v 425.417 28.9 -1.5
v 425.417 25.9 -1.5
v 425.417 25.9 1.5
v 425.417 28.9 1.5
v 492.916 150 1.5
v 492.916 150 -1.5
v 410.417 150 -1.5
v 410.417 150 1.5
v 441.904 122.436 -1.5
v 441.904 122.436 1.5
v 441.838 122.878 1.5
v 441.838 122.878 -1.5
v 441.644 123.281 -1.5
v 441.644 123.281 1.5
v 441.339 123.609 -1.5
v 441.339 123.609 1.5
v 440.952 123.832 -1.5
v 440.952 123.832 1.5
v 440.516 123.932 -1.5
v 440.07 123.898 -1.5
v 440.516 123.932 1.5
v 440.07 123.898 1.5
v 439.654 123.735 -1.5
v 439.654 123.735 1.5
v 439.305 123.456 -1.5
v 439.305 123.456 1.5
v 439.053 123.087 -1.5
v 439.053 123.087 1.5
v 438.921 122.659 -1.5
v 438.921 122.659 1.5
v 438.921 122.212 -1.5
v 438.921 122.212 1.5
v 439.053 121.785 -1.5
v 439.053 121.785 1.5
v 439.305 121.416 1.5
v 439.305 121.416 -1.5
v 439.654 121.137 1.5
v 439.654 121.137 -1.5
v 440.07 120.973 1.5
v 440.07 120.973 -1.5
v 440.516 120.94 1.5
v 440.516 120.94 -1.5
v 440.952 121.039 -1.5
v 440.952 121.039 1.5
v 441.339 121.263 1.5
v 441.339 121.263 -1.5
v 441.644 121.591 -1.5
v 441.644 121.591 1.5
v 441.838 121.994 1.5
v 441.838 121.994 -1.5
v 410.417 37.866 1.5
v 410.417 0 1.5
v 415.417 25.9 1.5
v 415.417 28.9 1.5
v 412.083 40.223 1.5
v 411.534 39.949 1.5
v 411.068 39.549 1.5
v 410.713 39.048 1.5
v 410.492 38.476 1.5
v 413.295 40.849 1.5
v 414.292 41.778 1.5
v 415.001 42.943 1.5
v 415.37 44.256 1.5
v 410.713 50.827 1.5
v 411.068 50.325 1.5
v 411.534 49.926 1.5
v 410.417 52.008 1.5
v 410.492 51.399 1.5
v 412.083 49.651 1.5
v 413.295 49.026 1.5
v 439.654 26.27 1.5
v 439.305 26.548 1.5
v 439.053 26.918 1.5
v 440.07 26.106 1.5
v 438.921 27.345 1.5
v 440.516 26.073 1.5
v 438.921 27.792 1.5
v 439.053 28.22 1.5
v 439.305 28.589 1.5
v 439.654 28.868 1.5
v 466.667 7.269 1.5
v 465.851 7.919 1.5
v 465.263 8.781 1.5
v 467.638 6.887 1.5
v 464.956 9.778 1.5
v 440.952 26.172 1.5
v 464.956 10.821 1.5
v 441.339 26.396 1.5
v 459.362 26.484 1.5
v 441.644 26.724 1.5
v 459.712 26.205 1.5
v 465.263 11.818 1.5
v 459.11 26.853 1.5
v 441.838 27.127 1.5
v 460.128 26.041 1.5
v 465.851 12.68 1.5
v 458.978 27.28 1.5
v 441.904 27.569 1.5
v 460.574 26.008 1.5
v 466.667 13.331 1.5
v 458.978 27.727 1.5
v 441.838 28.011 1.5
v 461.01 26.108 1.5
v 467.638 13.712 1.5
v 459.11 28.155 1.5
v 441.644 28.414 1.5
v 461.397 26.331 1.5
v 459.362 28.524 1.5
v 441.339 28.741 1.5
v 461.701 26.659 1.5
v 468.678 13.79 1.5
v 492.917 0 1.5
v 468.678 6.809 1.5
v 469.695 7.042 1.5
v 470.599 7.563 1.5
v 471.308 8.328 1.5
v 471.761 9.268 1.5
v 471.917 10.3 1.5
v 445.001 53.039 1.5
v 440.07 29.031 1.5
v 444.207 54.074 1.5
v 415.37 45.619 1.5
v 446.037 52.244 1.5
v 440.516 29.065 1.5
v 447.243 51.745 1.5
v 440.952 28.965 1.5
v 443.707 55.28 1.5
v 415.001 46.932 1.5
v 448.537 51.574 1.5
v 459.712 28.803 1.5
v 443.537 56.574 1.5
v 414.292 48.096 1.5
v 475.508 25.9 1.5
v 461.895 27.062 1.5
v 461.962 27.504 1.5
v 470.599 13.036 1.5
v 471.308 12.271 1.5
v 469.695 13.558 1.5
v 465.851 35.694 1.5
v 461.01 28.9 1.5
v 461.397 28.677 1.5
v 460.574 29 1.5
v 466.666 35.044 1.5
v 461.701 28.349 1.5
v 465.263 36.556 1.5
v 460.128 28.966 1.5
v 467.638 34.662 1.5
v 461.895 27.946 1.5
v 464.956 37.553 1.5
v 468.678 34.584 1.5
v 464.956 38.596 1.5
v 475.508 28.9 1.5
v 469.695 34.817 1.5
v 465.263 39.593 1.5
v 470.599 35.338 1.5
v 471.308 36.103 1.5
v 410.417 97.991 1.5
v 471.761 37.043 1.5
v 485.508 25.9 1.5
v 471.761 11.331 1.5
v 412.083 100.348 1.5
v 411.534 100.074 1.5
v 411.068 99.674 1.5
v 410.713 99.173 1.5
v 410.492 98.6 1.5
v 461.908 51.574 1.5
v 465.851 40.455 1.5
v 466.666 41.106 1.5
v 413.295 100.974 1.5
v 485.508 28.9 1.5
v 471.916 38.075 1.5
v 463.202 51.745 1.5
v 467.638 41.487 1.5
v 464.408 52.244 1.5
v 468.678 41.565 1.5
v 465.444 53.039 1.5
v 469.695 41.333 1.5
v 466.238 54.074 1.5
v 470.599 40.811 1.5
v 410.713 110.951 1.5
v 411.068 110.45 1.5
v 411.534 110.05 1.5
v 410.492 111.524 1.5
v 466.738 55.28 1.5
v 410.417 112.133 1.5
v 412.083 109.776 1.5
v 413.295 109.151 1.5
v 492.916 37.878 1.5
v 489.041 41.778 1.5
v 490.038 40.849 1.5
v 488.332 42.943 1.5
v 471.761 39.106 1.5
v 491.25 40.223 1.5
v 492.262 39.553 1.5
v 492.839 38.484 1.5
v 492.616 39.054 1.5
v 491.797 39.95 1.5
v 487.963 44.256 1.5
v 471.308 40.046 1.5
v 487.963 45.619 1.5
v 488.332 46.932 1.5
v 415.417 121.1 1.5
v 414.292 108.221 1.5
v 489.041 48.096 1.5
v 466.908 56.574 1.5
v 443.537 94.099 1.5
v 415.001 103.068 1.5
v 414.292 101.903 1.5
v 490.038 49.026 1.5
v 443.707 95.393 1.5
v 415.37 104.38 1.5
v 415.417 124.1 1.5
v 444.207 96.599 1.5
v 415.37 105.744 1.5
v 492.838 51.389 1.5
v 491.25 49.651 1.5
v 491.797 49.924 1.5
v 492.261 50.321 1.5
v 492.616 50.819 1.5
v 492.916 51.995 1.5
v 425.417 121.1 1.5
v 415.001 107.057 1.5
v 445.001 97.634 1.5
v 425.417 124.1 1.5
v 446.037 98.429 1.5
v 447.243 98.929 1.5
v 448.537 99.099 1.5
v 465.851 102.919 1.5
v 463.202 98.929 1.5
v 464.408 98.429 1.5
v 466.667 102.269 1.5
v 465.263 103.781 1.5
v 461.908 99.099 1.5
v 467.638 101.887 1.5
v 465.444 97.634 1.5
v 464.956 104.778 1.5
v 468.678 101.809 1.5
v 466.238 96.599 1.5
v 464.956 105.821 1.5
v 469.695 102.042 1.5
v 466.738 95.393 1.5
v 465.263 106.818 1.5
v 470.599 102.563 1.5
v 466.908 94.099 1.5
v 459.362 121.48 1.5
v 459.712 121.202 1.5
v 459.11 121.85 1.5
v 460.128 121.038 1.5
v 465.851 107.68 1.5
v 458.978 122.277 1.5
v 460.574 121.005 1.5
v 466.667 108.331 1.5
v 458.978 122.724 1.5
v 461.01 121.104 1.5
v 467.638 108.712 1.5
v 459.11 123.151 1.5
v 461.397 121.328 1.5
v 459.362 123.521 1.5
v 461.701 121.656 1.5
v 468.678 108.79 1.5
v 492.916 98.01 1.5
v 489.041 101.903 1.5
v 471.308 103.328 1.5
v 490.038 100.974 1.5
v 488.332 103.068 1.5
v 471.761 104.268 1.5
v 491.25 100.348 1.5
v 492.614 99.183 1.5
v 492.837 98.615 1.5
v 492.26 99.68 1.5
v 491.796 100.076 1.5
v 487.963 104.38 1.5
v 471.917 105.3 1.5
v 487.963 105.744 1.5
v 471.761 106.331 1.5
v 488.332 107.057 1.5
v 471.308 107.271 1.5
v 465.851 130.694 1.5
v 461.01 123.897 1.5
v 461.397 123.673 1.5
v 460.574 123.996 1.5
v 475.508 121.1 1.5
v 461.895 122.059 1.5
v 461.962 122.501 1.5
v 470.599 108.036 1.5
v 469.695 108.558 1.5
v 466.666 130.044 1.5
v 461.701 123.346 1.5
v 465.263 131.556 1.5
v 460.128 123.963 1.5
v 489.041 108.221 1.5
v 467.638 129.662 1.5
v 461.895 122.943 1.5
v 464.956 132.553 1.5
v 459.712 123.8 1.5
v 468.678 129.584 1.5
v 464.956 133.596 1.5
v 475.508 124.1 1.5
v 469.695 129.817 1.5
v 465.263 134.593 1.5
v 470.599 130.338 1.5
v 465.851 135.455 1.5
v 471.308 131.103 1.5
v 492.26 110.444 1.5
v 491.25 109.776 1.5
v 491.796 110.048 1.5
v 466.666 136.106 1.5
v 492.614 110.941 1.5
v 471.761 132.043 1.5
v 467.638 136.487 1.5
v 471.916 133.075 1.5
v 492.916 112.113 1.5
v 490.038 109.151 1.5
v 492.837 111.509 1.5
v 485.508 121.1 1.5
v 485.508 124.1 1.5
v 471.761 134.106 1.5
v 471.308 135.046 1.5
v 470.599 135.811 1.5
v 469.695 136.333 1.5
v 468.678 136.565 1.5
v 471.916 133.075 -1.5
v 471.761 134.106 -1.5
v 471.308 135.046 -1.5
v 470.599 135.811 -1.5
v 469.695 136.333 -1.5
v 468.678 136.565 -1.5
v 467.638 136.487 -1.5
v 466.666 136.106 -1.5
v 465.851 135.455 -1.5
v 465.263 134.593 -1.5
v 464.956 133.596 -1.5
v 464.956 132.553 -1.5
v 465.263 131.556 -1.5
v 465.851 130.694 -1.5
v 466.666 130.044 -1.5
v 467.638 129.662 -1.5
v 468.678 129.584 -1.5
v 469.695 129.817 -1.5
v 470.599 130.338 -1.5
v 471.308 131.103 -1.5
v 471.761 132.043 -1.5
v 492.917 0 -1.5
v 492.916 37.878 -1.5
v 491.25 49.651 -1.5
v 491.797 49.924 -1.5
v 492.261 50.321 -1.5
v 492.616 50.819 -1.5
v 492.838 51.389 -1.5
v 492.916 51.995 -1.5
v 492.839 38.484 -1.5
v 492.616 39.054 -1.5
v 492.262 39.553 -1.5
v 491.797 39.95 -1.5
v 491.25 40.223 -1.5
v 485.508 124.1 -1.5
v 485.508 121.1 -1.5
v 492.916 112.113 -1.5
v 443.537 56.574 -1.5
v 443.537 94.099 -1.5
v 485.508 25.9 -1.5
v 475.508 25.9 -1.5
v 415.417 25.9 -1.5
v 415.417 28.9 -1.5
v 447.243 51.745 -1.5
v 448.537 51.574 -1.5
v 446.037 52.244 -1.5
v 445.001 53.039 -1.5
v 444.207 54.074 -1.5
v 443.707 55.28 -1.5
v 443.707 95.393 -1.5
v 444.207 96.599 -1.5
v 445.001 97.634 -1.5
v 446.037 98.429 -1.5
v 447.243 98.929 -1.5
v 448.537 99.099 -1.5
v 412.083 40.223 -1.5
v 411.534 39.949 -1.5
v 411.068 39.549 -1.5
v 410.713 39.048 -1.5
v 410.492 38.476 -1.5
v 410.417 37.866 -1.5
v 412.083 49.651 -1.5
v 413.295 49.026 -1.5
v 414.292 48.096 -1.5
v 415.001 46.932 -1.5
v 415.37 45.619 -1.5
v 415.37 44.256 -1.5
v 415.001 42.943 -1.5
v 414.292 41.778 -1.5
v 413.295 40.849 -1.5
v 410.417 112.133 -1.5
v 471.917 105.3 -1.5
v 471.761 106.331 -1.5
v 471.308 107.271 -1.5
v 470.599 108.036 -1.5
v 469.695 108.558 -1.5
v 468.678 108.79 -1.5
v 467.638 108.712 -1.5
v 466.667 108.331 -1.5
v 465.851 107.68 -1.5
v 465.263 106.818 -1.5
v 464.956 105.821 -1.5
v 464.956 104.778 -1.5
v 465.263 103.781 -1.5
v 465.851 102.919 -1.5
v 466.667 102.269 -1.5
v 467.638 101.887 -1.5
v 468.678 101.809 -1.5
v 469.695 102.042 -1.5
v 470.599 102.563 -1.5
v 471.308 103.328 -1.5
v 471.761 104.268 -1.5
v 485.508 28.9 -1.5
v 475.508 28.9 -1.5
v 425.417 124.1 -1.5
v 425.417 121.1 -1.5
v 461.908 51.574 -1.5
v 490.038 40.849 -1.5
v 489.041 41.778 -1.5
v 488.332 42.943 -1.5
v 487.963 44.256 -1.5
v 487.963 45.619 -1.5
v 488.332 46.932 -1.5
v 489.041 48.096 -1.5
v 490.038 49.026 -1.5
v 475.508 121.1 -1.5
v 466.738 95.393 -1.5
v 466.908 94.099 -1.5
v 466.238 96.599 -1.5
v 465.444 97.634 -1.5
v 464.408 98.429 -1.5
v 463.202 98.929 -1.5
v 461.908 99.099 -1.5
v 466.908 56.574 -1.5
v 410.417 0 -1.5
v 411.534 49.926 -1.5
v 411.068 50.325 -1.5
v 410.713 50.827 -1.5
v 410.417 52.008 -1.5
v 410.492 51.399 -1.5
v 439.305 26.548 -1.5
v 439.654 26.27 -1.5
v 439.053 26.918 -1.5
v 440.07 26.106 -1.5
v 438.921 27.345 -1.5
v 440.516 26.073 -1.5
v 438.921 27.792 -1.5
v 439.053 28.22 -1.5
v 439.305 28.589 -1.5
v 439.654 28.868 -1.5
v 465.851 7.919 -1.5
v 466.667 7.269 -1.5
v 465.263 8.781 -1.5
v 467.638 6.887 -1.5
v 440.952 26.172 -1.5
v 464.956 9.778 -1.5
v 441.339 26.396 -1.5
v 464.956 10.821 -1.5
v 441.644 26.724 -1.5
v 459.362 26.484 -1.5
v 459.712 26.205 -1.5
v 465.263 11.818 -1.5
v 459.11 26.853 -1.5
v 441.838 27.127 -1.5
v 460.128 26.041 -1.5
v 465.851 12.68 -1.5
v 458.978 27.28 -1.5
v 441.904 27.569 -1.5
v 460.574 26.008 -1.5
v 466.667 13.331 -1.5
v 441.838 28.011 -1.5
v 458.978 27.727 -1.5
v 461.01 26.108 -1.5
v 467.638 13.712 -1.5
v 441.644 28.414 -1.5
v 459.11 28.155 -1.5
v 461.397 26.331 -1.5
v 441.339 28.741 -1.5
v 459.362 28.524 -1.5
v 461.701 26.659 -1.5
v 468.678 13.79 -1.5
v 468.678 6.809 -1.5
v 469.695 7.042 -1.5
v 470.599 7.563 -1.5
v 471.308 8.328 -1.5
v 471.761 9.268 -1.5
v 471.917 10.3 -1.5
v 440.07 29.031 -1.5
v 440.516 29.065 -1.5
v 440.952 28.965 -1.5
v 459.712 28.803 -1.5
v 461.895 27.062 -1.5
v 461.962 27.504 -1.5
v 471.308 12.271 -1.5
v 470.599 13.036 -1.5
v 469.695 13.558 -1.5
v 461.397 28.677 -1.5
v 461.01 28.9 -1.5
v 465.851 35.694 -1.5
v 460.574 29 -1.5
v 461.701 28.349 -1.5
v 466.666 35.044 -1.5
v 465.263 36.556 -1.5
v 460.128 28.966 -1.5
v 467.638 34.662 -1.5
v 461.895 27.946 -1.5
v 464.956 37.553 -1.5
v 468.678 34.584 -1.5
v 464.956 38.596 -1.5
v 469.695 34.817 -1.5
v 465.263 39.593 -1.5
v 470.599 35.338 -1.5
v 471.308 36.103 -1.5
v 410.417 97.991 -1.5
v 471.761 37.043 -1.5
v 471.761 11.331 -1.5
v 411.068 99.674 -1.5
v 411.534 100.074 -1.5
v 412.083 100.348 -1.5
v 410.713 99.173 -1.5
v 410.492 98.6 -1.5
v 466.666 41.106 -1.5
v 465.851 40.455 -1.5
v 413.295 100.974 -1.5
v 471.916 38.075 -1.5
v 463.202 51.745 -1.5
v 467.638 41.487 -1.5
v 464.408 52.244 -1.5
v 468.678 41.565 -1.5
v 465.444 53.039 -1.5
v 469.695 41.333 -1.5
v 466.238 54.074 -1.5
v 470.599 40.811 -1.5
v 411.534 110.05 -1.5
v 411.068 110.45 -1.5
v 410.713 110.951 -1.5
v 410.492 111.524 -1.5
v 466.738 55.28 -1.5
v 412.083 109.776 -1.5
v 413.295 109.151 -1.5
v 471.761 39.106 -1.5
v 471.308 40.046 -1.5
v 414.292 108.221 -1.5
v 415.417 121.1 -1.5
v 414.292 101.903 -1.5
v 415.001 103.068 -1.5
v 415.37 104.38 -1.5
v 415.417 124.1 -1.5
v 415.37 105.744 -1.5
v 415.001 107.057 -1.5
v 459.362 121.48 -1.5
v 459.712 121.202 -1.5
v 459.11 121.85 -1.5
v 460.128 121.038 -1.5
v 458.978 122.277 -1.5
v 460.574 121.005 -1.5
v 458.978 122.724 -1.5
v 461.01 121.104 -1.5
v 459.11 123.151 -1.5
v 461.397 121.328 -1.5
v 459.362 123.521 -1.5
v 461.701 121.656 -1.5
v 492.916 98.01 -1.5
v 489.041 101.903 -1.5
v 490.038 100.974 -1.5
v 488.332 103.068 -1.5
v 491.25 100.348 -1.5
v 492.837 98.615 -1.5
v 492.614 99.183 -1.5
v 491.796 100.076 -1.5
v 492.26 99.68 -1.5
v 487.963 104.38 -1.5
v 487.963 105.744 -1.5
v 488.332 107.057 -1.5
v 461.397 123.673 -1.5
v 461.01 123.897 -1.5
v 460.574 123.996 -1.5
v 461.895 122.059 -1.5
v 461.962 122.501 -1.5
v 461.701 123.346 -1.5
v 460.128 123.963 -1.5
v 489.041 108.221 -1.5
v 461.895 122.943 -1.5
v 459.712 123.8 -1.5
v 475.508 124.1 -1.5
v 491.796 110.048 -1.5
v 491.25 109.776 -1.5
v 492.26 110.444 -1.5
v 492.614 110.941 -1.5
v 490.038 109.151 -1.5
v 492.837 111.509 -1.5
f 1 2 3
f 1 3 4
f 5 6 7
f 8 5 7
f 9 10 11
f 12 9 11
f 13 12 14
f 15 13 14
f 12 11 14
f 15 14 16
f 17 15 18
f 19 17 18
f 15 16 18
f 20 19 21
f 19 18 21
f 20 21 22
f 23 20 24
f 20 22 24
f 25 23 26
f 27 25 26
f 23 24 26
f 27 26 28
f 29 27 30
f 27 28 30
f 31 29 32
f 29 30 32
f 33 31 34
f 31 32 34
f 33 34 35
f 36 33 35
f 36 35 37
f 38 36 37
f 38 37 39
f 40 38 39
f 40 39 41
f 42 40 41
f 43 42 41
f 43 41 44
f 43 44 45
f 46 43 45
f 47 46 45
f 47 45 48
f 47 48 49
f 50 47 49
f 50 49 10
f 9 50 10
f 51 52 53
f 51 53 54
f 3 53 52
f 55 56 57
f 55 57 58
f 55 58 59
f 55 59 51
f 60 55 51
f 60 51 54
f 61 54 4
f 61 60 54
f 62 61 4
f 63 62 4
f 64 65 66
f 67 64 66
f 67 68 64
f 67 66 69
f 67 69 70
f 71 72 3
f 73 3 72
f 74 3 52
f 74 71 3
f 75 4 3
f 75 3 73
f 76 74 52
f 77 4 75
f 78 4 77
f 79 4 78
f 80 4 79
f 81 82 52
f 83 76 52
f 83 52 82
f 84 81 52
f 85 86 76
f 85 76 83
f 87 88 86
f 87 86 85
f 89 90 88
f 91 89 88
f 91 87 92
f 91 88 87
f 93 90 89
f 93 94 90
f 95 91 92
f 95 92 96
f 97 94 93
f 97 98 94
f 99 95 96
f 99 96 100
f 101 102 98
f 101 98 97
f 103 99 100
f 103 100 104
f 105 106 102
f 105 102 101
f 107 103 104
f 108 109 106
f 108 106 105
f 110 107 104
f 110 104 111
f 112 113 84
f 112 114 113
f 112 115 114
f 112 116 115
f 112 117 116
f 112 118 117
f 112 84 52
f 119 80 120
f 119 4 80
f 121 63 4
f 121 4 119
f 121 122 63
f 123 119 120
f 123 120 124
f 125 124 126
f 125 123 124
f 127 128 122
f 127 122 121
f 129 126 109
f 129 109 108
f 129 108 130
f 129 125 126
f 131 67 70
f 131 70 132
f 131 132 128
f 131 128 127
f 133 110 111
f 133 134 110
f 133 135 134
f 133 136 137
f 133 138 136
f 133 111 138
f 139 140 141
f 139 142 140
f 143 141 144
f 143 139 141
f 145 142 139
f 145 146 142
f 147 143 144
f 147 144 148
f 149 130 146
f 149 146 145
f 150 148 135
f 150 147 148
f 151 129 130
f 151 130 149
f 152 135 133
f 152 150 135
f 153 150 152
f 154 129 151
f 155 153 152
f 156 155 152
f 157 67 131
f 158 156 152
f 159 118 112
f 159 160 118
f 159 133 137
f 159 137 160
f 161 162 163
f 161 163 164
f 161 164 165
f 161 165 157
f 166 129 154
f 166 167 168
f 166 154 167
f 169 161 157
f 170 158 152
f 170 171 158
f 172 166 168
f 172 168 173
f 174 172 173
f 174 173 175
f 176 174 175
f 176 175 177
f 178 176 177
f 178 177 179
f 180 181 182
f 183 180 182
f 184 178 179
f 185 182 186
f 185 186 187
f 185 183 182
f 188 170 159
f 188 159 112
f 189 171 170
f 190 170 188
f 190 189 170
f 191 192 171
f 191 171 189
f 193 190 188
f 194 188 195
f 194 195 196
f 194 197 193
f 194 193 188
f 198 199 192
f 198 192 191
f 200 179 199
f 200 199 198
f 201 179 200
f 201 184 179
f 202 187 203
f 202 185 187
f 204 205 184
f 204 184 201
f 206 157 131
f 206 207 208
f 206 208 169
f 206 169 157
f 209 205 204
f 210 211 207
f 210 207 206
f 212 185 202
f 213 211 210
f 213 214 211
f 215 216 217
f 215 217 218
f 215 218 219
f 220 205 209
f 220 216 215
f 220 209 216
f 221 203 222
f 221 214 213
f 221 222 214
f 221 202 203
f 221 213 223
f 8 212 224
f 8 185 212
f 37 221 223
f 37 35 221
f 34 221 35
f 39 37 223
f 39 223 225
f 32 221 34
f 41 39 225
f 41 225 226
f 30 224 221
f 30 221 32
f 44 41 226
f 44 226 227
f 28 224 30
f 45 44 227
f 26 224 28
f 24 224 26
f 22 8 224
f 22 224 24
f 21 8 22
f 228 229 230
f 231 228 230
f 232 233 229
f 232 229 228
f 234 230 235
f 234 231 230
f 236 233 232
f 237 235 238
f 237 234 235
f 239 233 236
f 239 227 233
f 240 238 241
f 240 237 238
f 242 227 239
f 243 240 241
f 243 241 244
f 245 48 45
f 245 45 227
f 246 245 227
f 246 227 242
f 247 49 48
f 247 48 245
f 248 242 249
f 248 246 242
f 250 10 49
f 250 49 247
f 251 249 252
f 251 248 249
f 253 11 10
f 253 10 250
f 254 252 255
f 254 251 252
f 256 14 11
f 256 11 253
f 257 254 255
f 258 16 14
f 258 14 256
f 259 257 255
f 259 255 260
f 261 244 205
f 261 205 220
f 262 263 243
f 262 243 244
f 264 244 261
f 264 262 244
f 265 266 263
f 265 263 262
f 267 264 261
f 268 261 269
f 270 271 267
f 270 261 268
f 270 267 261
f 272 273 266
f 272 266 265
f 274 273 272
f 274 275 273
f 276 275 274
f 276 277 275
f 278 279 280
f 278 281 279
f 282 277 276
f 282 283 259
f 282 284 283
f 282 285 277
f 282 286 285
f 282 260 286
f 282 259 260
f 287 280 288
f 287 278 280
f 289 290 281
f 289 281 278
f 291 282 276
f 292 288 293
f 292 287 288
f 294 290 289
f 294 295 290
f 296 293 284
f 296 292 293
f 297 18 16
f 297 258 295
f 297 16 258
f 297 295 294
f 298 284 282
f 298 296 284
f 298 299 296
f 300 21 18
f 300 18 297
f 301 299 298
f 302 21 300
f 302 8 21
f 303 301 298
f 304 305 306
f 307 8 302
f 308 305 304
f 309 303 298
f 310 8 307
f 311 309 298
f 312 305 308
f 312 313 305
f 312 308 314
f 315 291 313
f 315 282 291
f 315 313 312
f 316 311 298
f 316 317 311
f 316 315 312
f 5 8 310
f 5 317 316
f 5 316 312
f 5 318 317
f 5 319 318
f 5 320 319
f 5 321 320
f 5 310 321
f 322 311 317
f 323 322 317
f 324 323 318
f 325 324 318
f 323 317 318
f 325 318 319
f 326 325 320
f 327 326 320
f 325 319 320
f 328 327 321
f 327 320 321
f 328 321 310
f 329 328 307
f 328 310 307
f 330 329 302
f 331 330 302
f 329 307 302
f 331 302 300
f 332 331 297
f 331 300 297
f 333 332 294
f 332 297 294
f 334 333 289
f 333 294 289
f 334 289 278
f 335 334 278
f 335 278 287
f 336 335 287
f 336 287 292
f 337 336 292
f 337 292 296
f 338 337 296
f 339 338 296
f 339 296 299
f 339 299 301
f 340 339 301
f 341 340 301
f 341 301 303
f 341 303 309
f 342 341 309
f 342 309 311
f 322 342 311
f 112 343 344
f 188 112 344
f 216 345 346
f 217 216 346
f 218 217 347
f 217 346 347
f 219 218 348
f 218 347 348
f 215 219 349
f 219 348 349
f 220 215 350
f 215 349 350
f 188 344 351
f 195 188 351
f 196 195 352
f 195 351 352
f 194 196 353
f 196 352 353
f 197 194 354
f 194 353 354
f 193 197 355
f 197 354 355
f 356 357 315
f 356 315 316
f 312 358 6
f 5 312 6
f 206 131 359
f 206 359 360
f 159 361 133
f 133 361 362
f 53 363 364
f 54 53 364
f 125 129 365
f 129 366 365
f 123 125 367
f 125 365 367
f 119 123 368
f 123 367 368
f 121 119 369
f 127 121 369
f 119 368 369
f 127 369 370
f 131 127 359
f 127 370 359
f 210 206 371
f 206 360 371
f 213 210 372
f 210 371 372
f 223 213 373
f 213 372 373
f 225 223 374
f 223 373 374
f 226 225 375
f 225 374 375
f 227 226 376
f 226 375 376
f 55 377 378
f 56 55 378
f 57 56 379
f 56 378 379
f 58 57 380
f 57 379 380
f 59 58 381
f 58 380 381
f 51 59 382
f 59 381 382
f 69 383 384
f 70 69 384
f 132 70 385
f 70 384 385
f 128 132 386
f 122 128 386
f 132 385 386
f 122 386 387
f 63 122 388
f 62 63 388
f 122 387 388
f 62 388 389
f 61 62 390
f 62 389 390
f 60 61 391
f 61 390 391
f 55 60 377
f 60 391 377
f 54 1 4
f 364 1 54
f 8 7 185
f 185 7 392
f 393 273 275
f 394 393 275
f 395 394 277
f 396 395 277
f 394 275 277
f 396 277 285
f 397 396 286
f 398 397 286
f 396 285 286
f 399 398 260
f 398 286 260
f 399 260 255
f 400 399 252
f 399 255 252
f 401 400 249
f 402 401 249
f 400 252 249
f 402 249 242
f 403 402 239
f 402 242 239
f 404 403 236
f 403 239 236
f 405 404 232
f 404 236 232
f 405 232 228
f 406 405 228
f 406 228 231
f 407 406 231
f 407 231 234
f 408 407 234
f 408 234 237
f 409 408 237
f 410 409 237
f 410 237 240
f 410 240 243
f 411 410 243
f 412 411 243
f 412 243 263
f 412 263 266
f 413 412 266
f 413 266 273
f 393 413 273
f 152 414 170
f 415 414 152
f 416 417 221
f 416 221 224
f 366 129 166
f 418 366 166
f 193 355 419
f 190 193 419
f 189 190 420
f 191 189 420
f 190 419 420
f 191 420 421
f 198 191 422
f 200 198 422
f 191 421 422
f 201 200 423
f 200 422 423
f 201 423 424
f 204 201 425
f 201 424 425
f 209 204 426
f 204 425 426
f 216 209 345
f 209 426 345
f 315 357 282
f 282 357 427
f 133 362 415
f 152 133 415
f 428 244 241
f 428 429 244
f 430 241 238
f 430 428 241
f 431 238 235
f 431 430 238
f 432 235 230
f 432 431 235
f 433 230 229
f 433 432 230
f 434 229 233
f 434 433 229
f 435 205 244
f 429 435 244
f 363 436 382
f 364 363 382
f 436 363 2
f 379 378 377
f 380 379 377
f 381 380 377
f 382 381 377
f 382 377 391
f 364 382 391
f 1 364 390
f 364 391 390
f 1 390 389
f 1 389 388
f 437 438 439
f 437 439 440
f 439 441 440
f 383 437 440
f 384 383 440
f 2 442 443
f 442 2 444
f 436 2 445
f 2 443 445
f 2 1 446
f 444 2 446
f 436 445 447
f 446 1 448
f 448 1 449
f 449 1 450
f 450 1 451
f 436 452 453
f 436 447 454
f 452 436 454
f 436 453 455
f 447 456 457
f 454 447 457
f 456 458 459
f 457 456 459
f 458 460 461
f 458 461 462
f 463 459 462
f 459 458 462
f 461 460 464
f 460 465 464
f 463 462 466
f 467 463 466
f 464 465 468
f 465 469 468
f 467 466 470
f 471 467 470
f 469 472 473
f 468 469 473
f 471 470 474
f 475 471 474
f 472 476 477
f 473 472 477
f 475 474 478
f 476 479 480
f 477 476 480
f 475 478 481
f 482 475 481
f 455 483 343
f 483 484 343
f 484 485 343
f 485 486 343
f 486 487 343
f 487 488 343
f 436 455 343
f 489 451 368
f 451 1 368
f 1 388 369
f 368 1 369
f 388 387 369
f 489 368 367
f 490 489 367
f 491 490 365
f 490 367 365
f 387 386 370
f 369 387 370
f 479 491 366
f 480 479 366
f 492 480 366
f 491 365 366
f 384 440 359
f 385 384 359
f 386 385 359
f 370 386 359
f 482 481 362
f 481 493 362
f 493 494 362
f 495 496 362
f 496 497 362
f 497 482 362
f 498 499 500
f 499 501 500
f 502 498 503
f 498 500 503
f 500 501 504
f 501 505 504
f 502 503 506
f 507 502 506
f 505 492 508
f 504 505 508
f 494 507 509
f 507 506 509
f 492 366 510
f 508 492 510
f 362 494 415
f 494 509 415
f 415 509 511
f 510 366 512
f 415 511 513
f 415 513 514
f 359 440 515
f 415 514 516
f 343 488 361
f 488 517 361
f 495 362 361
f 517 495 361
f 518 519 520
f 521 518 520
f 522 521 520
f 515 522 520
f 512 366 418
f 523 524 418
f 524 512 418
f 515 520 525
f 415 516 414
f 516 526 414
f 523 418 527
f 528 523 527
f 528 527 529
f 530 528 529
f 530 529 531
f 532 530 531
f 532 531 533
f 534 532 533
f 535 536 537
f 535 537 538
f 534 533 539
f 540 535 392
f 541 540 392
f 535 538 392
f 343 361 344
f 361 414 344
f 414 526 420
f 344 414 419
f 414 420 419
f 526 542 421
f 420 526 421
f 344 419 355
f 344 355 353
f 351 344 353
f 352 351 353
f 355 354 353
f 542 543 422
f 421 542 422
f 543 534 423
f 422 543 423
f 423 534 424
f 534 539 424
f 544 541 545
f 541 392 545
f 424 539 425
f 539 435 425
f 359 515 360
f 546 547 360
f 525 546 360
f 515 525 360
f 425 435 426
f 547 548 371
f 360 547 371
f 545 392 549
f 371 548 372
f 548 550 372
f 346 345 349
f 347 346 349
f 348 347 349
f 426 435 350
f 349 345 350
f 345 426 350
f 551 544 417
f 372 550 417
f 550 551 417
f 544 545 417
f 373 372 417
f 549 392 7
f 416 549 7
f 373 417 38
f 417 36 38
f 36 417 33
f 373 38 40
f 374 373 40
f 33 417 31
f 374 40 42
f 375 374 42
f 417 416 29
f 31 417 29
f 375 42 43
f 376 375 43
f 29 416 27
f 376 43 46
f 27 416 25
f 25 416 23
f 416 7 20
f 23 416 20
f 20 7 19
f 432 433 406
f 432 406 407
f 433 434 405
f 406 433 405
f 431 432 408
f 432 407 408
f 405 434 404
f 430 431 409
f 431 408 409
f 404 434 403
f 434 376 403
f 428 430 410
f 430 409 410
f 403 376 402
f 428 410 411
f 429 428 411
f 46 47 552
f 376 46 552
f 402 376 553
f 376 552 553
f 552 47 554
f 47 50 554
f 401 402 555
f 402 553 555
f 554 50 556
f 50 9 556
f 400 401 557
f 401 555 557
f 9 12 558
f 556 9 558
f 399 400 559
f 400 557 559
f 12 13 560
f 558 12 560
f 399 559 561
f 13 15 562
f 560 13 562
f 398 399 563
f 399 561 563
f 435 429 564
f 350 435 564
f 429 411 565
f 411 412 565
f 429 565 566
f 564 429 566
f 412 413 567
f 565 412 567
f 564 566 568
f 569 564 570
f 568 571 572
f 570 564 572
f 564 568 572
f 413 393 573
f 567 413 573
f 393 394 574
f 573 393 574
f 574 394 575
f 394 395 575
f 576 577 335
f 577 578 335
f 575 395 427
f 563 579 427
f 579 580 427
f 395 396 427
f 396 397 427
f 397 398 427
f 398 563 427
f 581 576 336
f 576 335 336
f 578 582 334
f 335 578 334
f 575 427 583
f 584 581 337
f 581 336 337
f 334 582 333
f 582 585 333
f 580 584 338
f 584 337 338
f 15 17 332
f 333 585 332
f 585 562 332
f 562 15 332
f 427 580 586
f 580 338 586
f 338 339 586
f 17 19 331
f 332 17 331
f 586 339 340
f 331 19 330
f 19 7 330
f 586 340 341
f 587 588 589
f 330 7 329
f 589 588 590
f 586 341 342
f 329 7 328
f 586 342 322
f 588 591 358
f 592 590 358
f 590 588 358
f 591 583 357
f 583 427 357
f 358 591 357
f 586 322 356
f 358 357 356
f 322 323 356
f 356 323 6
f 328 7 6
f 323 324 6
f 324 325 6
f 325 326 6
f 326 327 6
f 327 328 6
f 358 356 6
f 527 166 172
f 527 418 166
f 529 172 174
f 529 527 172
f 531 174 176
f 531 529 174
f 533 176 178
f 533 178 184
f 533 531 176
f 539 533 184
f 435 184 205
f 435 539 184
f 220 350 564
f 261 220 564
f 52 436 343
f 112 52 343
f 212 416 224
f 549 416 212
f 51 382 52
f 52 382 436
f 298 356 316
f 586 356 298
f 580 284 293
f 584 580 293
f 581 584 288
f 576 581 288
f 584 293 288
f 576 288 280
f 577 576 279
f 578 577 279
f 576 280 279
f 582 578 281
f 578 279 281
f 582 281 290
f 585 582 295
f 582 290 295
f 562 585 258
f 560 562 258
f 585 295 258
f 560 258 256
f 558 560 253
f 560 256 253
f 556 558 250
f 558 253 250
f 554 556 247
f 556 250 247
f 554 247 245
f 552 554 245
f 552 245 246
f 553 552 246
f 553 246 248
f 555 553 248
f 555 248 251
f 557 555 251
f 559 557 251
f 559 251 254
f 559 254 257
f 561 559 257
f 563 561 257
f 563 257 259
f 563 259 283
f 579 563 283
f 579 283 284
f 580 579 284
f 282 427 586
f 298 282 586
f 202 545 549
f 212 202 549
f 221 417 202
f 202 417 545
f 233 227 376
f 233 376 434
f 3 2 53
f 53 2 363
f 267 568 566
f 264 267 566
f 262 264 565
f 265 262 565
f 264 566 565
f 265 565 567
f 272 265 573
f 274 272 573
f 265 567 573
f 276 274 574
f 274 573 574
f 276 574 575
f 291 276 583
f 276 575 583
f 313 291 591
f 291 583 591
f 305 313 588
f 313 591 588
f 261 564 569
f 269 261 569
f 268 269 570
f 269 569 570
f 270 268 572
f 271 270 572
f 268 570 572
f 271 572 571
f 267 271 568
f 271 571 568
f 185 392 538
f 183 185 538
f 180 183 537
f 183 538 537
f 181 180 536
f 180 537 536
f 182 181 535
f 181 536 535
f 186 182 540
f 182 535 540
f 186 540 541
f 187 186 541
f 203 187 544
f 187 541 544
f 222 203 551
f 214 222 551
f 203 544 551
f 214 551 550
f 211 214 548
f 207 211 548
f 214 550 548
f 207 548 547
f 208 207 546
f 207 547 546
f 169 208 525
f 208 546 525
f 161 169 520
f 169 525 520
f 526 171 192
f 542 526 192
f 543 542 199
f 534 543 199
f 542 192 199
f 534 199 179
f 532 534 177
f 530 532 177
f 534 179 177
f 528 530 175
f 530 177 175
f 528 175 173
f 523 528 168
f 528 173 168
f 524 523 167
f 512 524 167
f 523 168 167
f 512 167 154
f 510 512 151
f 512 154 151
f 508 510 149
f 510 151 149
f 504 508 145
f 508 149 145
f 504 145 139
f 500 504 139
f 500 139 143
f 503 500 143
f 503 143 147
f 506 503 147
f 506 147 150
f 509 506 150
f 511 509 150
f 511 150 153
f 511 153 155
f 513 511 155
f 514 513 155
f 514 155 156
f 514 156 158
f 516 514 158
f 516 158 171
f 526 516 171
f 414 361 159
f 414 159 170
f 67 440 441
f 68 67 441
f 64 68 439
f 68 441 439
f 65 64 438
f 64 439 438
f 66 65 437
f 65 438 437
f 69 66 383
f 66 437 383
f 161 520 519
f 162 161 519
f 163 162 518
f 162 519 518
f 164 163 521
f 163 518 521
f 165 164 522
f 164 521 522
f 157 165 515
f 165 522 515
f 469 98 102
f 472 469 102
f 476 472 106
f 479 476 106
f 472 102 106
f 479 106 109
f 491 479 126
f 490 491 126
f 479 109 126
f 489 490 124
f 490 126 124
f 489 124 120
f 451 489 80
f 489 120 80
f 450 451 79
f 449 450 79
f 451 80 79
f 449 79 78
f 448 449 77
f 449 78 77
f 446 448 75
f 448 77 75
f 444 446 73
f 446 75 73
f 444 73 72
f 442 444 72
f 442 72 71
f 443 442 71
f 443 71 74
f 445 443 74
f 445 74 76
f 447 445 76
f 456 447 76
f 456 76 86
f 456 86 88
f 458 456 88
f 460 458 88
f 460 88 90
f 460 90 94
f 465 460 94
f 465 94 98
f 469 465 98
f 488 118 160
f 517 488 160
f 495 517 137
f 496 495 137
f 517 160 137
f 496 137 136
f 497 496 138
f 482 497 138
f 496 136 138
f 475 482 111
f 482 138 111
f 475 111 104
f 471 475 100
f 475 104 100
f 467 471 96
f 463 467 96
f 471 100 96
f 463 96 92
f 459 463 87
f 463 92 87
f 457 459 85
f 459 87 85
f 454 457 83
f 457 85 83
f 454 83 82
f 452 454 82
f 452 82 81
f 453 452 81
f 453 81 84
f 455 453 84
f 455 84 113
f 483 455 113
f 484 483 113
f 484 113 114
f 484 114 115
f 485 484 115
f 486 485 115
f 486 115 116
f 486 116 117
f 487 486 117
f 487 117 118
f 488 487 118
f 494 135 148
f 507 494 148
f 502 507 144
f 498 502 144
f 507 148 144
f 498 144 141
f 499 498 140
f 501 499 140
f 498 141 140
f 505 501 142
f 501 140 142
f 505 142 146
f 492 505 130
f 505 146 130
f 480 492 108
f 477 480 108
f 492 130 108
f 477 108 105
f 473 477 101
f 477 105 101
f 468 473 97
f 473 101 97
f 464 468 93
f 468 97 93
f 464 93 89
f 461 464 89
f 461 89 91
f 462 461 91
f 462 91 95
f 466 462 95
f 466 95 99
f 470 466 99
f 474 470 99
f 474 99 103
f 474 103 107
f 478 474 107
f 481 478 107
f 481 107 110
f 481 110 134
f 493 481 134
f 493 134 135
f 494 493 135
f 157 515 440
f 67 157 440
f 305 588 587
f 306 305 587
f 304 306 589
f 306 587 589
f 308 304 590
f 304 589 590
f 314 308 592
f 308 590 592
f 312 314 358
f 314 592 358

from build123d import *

# Parameters (mm, degrees)
SALIENTE_EXTRUIR1_START = -1.5
SALIENTE_EXTRUIR1_DEPTH = 3
CROQUIS4_W              = 23.371648172
CROQUIS4_H              = 47.52448784
CORTAR_EXTRUIR3_DEPTH   = 10
CROQUIS5_W              = 9.999999994
CROQUIS5_H              = 3
CROQUIS5_W_2            = 9.999999993
CORTAR_EXTRUIR4_DEPTH   = 10
CROQUIS6_R              = 1.5
CROQUIS6_R_2            = 3.5
CORTAR_EXTRUIR5_DEPTH   = 10
REDONDEO1_R             = 5


# Read off the part's stored shape, not the designer's step: Saliente-Extruir1
with BuildPart() as part:
    # Saliente-Extruir1 outline → Saliente-Extruir1 (new body)
    with BuildSketch(Plane.XY.offset(SALIENTE_EXTRUIR1_START)):
        with BuildLine():
            ThreePointArc((492.916449572, 98.009593947), (492.452410006, 99.442022929), (491.249851225, 100.348134338))
            ThreePointArc((491.249851225, 100.348134338), (487.916517891, 105.062179546), (491.249851225, 109.776224754))
            ThreePointArc((491.249851225, 109.776224754), (492.452037009, 110.681812922), (492.916439741, 112.113480025))
            Line((492.916439741, 112.113480025), (492.916413331, 149.999679341))
            Line((492.916413331, 149.999679341), (410.416517891, 149.999679341))
            Line((410.416517891, 149.999679341), (410.416517891, 112.133247358))
            ThreePointArc((410.416517891, 112.133247358), (410.875276439, 110.689871685), (412.083184558, 109.776224754))
            ThreePointArc((412.083184558, 109.776224754), (415.416517891, 105.062179546), (412.083184558, 100.348134338))
            ThreePointArc((412.083184558, 100.348134338), (410.875276439, 99.434487407), (410.416517891, 97.991111734))
            Line((410.416517891, 97.991111734), (410.416517891, 52.008362374))
            ThreePointArc((410.416517891, 52.008362374), (410.875276439, 50.564986701), (412.083184558, 49.65133977))
            ThreePointArc((412.083184558, 49.65133977), (415.416517891, 44.937294562), (412.083184558, 40.223249354))
            ThreePointArc((412.083184558, 40.223249354), (410.875276439, 39.309602423), (410.416517891, 37.86622675))
            Line((410.416517891, 37.86622675), (410.416517891, -0.000320659))
            Line((410.416517891, -0.000320659), (492.916517891, -0.000320659))
            Line((492.916517891, -0.000320659), (492.916491488, 37.877716604))
            ThreePointArc((492.916491488, 37.877716604), (492.45443711, 39.314289338), (491.249851225, 40.223249354))
            ThreePointArc((491.249851225, 40.223249354), (487.916517891, 44.937294562), (491.249851225, 49.65133977))
            ThreePointArc((491.249851225, 49.65133977), (492.453865854, 50.559496169), (492.916481647, 51.994900607))
            Line((492.916481647, 51.994900607), (492.916449572, 98.009593947))
        make_face()
    extrude(amount=SALIENTE_EXTRUIR1_DEPTH)

    # Croquis4 → Cortar-Extruir3 (cut)
    with BuildSketch(Plane.XY.offset(1.5)):
        with Locations((455.222459901, 75.336681949)):
            Rectangle(CROQUIS4_W, CROQUIS4_H)
    extrude(amount=-CORTAR_EXTRUIR3_DEPTH, mode=Mode.SUBTRACT)

    # Croquis5 → Cortar-Extruir4 (cut)
    with BuildSketch(Plane(origin=(0, 0, -1.5), x_dir=(-1, 0, 0), z_dir=(0, 0, -1))):
        with Locations((-420.416517885, 27.399679341)):
            Rectangle(CROQUIS5_W, CROQUIS5_H)
        with Locations((-480.50829052, 27.399679341)):
            Rectangle(CROQUIS5_W_2, CROQUIS5_H)
        with Locations((-480.50829052, 122.599679342)):
            Rectangle(CROQUIS5_W_2, CROQUIS5_H)
        with Locations((-420.416517885, 122.599679342)):
            Rectangle(CROQUIS5_W, CROQUIS5_H)
    extrude(amount=-CORTAR_EXTRUIR4_DEPTH, mode=Mode.SUBTRACT)

    # Croquis6 → Cortar-Extruir5 (cut)
    with BuildSketch(Plane.XY.offset(1.5)):
        with Locations((460.461664074, 27.503843939)):
            Circle(CROQUIS6_R)
        with Locations((440.404261852, 27.568711017)):
            Circle(CROQUIS6_R)
        with Locations((468.41649135, 38.074679341)):
            Circle(CROQUIS6_R_2)
        with Locations((468.416510711, 10.299679341)):
            Circle(CROQUIS6_R_2)
        with Locations((440.404261852, 122.435783537)):
            Circle(CROQUIS6_R)
        with Locations((460.461664074, 122.500650615)):
            Circle(CROQUIS6_R)
        with Locations((468.41649135, 133.074679341)):
            Circle(CROQUIS6_R_2)
        with Locations((468.416510711, 105.299679341)):
            Circle(CROQUIS6_R_2)
    extrude(amount=-CORTAR_EXTRUIR5_DEPTH, mode=Mode.SUBTRACT)

    # Redondeo1
    redondeo1_edges = [part.edges().sort_by_distance(p)[0] for p in [
        (466.908283987, 99.098925869, 0),
        (466.908283987, 51.574438029, 0),
        (443.536635815, 51.574438029, 0),
        (443.536635815, 99.098925869, 0),
    ]]
    fillet(redondeo1_edges, radius=REDONDEO1_R)


solid = part.part
